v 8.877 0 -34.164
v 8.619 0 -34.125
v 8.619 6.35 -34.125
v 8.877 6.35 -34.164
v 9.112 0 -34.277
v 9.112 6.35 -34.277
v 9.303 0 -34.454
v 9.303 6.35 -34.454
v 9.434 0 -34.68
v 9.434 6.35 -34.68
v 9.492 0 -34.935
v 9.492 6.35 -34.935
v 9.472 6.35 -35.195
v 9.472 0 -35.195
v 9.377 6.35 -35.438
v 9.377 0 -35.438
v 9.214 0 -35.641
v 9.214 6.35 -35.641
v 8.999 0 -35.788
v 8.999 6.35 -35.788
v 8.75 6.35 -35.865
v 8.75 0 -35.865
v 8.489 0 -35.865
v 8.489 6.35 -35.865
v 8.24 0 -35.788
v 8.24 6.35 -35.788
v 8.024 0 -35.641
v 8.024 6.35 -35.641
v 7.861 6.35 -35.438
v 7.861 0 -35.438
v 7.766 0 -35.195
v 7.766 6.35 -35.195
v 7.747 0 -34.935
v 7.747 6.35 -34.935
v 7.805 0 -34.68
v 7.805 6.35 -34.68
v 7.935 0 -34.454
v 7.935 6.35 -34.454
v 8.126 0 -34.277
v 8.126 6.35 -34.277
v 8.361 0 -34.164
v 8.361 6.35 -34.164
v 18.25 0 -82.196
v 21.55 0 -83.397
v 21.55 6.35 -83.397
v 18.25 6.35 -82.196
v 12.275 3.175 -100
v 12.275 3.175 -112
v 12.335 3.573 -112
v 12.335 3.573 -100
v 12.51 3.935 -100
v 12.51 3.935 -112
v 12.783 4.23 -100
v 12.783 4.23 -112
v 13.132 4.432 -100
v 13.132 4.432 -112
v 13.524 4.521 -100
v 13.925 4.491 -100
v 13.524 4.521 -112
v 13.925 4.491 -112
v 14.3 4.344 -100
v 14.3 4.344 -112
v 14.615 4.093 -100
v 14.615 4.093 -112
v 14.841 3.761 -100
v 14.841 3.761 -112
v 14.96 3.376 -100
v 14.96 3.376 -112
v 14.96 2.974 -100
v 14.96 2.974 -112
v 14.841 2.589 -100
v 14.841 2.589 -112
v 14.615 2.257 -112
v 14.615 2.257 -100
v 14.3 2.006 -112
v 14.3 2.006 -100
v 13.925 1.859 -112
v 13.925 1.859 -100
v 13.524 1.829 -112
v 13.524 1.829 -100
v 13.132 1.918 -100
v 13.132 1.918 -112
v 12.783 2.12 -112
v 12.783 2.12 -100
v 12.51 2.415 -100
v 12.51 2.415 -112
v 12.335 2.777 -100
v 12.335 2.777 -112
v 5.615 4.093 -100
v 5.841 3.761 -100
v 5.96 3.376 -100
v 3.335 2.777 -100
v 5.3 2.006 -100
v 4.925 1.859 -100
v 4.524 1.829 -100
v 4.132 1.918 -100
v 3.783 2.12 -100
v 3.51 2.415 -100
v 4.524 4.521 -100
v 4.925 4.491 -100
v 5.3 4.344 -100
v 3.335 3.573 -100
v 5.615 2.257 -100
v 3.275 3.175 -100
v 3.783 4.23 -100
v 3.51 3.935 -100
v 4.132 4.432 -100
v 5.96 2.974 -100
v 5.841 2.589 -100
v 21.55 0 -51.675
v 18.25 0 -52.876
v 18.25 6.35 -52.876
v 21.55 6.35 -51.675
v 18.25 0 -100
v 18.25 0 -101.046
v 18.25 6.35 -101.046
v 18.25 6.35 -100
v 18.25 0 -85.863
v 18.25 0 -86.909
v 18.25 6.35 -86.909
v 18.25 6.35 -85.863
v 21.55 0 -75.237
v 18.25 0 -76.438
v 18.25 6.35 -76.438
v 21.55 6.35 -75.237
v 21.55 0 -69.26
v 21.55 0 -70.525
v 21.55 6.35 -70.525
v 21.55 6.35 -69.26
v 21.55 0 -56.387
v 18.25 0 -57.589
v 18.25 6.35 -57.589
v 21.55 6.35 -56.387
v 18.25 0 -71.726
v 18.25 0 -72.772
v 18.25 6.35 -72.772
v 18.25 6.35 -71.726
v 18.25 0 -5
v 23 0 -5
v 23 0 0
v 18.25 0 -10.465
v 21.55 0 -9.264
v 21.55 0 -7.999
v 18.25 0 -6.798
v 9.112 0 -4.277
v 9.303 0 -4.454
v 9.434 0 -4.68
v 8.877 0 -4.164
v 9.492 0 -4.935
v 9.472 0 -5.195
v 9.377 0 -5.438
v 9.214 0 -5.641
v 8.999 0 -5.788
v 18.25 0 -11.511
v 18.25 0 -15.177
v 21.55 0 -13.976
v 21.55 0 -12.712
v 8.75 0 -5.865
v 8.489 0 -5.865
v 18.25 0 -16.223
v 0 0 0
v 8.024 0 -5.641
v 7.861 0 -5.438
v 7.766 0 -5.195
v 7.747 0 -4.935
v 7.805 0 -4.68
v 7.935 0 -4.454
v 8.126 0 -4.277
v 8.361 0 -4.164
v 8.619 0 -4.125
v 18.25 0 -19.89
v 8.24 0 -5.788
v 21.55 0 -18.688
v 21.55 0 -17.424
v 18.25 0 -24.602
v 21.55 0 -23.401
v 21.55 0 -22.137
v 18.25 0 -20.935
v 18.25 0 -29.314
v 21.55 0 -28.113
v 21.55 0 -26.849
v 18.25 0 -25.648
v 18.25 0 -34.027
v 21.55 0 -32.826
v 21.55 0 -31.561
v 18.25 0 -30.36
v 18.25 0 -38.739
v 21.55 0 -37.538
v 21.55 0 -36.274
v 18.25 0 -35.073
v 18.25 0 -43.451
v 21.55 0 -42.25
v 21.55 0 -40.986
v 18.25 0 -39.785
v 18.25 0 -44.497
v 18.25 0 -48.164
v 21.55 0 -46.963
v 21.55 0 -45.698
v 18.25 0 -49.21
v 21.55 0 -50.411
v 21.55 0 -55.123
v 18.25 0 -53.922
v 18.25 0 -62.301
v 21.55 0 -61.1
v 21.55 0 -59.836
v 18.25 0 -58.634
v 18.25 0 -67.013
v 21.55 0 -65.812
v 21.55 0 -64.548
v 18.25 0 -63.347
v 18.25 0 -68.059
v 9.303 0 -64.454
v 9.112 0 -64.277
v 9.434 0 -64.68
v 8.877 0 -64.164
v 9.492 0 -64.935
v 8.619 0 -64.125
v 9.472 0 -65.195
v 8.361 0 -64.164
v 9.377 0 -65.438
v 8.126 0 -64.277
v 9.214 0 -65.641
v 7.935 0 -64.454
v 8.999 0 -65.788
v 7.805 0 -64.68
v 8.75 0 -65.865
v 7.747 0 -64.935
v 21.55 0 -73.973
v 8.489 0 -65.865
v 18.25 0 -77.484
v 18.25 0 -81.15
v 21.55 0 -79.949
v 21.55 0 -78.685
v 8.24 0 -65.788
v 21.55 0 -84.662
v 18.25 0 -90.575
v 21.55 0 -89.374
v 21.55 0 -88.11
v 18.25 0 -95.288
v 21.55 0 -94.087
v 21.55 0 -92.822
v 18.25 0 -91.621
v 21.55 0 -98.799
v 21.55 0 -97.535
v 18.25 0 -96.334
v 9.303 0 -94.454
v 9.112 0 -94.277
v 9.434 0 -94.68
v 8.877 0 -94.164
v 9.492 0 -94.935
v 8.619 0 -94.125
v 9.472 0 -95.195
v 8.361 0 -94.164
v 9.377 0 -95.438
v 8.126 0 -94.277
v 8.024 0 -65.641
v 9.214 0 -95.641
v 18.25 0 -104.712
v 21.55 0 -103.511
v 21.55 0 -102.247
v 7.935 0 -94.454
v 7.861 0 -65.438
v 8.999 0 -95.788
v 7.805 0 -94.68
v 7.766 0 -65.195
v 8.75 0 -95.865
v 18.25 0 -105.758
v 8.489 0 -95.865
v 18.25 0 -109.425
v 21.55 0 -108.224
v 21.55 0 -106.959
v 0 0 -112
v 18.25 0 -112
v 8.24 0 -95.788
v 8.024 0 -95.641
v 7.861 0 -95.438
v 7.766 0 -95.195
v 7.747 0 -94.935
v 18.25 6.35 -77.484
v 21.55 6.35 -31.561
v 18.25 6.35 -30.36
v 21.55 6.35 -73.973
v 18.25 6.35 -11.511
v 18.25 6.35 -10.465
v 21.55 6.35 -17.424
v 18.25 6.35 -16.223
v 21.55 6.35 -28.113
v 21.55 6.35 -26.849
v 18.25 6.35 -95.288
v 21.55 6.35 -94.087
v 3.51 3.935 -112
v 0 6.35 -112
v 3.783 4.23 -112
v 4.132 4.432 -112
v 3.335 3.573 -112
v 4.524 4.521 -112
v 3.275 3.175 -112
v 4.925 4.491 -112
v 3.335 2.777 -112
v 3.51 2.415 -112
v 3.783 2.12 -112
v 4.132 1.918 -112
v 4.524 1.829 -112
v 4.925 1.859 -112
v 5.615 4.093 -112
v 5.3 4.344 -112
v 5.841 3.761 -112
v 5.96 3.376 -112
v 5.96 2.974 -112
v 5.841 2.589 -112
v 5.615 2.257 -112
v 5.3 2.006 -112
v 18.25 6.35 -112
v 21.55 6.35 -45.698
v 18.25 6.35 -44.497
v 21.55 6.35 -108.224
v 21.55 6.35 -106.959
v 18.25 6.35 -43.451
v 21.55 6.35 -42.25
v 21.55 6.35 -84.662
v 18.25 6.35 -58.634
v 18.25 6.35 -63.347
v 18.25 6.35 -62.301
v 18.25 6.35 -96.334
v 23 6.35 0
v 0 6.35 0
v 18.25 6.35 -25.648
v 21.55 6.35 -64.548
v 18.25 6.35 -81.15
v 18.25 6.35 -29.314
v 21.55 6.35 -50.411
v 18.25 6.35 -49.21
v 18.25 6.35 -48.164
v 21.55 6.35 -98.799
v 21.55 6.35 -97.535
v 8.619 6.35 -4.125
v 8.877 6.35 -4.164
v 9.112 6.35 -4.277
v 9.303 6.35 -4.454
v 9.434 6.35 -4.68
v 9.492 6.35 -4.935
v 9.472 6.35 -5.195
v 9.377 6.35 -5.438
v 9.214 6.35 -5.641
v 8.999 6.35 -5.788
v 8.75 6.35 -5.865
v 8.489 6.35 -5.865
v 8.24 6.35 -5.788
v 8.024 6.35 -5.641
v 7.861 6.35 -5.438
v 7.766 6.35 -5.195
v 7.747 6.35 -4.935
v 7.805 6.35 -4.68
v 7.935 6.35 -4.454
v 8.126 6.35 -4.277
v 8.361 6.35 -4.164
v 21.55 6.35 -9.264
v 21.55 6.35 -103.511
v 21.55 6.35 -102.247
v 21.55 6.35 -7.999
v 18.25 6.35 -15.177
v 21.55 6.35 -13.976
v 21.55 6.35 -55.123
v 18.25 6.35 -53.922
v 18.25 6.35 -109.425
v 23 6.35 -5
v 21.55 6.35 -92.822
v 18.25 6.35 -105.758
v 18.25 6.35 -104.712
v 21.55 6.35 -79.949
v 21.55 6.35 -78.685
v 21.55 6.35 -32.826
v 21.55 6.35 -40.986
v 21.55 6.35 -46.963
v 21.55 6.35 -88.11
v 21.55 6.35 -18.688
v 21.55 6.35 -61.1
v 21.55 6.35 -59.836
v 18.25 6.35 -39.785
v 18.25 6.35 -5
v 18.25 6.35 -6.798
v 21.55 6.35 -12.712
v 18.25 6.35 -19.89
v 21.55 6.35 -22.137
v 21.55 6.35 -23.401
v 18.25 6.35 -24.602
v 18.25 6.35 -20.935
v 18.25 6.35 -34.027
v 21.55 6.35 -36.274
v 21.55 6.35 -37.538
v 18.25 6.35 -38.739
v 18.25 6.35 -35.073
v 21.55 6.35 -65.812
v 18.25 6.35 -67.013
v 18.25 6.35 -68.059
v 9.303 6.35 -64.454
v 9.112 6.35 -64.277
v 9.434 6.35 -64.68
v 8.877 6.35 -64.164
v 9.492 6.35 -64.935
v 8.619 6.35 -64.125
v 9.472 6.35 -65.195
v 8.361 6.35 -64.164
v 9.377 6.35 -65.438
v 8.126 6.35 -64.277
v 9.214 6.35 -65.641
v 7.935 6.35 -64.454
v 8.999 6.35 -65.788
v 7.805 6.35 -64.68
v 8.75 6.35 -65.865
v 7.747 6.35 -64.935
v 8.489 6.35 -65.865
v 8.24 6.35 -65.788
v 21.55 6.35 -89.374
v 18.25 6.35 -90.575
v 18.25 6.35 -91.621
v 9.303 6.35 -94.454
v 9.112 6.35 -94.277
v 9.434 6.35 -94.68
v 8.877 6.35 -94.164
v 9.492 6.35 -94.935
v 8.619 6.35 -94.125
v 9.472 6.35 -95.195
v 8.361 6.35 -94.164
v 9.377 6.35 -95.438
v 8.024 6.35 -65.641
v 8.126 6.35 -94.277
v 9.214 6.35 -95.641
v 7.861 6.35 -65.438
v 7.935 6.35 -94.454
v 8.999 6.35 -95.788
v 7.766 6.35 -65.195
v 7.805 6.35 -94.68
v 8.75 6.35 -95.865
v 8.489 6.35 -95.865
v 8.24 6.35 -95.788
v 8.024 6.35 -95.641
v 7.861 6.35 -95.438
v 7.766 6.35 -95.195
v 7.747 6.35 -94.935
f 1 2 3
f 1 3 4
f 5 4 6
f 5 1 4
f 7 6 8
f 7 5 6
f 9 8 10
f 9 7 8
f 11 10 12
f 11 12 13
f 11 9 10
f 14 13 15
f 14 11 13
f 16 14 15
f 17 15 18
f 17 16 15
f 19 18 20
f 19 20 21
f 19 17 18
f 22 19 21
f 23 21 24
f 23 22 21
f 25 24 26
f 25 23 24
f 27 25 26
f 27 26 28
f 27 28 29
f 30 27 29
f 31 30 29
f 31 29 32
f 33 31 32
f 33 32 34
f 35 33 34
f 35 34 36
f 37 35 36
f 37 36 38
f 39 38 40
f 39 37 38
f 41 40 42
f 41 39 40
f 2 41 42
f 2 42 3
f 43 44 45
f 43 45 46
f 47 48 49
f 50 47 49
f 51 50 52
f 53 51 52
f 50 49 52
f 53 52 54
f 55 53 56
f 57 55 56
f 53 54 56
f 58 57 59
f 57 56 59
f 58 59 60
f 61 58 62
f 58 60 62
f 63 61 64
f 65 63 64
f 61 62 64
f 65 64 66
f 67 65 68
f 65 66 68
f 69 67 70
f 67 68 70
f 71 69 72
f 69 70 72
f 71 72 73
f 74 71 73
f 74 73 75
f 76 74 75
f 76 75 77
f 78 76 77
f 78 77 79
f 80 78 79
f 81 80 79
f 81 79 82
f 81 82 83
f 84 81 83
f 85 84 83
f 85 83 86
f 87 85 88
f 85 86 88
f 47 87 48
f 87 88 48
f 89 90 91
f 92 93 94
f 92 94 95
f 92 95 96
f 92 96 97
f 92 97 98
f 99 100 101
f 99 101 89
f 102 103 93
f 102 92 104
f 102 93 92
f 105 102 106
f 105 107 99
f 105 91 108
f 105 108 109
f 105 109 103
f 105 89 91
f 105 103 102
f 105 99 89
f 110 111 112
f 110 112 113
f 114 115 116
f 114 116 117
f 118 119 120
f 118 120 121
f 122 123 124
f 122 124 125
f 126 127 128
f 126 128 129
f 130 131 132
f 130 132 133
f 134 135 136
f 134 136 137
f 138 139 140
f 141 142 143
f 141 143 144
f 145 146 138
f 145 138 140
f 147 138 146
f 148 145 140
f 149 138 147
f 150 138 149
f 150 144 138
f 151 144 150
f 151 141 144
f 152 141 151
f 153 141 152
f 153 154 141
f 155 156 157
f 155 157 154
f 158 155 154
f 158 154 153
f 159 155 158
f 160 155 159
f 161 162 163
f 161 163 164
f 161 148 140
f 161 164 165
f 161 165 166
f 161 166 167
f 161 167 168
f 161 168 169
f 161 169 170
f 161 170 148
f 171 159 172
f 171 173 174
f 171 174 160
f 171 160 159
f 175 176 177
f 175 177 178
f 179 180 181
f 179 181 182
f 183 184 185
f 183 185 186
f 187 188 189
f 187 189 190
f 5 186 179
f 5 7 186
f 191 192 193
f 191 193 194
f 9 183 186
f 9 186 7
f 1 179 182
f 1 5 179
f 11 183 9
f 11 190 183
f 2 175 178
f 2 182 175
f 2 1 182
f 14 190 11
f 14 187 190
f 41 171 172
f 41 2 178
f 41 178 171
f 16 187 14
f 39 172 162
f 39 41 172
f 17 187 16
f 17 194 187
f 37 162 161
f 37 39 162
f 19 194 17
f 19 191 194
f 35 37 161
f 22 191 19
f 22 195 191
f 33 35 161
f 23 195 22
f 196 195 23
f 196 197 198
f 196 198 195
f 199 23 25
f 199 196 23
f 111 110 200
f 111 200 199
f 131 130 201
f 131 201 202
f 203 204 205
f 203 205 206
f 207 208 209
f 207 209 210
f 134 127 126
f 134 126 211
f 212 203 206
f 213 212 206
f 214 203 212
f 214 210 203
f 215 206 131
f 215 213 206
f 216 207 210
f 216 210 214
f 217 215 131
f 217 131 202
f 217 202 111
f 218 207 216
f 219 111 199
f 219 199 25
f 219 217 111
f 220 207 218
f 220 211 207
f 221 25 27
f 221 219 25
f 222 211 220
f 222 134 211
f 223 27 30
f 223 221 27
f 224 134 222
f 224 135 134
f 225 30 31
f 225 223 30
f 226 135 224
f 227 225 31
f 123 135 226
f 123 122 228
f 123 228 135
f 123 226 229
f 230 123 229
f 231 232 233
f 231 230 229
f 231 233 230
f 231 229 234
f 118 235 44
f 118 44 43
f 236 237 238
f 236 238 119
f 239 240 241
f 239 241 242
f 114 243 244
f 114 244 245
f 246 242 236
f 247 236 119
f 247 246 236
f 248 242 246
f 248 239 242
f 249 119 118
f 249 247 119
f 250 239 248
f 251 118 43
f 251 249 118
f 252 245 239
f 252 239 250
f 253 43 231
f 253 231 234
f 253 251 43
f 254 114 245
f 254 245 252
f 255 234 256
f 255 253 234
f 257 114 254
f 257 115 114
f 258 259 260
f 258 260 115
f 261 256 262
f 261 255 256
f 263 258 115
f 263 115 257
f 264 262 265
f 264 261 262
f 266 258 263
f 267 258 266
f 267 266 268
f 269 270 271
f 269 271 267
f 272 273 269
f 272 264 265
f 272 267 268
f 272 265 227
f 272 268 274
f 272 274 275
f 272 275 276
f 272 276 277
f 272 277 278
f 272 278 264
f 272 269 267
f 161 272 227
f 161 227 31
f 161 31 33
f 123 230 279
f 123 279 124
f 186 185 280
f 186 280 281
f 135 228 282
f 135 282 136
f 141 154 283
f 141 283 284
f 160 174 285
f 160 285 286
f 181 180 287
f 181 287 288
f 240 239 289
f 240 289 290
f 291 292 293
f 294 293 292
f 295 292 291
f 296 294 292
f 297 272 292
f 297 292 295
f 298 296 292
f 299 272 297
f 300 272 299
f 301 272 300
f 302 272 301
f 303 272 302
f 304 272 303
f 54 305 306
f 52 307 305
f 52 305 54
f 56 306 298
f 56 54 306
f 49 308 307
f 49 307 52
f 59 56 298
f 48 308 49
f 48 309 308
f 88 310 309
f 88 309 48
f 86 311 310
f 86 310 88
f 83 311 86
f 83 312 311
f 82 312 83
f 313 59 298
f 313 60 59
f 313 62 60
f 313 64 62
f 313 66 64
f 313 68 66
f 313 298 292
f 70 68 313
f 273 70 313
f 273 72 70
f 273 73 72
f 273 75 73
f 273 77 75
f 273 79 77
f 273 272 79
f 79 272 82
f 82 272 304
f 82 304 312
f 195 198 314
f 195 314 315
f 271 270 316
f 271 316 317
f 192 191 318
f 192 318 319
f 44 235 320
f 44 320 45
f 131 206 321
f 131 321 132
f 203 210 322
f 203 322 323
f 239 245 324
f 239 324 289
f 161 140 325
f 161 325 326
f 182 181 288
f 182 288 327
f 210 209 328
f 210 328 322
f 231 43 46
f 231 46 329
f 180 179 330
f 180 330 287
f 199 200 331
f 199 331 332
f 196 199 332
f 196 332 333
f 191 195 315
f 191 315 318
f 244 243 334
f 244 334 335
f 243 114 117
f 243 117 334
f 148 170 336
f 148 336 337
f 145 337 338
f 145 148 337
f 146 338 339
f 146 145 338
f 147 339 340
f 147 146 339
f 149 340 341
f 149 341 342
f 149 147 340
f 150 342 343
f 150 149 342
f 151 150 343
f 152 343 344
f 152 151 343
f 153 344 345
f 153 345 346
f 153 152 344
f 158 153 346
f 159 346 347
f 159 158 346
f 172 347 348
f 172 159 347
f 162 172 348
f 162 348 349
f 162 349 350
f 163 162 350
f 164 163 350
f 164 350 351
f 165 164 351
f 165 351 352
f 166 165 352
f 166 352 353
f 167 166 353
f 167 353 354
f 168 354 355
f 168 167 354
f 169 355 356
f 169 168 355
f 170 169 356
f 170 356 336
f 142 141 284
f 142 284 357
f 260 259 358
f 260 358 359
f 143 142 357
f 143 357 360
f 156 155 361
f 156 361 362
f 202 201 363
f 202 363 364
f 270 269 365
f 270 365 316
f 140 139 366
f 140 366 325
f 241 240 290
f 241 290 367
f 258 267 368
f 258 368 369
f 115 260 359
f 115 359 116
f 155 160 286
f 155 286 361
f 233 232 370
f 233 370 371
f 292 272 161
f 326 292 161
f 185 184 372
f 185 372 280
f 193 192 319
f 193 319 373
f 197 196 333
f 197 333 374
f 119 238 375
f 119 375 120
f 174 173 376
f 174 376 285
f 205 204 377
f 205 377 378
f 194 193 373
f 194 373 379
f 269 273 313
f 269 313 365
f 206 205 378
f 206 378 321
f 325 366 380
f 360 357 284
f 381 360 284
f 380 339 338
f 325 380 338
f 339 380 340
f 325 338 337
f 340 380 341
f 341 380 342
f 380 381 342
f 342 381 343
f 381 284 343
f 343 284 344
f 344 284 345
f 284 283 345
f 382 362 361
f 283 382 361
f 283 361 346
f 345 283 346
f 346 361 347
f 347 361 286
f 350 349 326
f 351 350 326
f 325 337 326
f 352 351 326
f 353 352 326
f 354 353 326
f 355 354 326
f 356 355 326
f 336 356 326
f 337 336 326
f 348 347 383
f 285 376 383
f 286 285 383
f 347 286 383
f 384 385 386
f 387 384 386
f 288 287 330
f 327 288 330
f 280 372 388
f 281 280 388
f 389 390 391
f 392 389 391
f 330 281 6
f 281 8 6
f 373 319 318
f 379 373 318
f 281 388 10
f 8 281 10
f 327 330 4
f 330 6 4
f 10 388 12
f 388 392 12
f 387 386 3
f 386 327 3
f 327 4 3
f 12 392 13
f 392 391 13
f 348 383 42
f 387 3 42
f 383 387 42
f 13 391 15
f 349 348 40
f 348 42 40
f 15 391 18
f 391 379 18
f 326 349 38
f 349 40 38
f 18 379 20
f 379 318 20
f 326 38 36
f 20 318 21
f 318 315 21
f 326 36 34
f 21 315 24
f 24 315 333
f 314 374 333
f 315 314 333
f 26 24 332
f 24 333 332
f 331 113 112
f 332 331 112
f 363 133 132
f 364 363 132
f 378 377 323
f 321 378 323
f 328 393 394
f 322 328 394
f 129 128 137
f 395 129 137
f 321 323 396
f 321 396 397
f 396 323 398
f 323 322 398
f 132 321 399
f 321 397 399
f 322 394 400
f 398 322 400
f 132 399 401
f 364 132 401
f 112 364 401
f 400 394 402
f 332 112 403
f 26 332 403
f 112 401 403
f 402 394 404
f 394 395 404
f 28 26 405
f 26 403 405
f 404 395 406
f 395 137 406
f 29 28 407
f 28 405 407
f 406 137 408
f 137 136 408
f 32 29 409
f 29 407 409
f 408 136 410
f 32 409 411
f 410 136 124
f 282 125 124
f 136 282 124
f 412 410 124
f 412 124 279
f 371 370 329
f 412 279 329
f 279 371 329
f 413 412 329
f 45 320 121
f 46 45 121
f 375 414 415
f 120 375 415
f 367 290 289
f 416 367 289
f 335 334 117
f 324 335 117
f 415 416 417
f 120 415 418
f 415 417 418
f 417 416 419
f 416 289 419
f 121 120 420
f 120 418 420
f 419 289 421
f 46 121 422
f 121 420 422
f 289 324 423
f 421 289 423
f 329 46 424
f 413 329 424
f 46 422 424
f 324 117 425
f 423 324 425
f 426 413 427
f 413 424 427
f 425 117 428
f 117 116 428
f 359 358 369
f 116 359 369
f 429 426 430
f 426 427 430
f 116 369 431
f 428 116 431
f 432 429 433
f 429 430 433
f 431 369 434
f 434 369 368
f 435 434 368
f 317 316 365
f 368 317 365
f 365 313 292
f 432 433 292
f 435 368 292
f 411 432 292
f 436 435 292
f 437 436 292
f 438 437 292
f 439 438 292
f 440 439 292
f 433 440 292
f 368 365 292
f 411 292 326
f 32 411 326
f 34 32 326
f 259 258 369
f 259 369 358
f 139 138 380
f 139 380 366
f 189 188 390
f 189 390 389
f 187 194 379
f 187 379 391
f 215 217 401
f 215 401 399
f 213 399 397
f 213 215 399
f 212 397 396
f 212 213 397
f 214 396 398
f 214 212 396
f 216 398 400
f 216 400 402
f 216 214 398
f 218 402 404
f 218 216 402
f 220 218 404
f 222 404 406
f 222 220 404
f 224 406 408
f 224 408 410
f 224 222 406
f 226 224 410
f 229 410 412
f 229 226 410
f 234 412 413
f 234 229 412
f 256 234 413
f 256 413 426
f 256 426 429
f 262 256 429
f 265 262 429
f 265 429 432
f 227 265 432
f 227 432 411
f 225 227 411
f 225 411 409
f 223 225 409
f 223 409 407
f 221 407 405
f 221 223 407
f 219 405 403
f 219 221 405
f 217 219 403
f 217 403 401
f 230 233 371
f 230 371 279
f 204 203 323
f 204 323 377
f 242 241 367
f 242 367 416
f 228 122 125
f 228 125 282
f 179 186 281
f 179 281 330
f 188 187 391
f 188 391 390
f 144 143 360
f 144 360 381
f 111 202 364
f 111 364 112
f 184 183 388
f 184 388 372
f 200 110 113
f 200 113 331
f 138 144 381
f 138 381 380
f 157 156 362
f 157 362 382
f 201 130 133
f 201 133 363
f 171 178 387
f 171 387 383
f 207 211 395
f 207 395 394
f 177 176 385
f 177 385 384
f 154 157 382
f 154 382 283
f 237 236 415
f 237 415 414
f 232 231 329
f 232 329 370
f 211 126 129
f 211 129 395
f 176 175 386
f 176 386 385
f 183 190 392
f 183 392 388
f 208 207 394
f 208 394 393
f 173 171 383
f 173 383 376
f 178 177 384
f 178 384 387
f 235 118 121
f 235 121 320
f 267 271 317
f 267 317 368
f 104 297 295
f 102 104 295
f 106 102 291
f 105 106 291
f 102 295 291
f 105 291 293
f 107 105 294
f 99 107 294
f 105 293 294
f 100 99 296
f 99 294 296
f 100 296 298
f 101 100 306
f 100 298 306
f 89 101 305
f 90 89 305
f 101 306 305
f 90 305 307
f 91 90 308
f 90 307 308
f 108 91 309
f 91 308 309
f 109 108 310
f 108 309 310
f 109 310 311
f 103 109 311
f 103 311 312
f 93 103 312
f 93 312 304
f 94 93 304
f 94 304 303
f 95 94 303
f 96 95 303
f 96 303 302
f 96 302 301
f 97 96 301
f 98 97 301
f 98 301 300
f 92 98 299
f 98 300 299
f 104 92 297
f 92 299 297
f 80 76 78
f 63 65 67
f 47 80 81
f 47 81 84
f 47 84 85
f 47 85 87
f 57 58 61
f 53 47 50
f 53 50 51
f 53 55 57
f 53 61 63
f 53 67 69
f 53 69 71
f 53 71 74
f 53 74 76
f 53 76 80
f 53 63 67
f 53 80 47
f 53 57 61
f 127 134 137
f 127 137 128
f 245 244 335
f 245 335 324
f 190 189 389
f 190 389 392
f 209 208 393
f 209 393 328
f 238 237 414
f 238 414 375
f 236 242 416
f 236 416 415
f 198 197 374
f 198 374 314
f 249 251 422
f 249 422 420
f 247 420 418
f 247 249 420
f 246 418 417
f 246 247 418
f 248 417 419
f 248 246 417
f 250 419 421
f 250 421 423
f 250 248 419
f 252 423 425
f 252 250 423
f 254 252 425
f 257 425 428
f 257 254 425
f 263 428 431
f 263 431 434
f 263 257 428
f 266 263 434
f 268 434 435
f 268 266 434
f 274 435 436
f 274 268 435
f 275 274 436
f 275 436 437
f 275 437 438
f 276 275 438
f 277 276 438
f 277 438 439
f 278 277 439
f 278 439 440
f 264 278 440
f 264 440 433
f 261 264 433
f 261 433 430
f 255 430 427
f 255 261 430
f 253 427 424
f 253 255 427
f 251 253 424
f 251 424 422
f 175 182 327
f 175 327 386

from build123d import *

# Parameters (mm, degrees)
SKETCH1_R           = 0.875
BOSS_EXTRUDE1_DEPTH = 6.35
SKETCH2_R           = 1.35
CUT_EXTRUDE1_DEPTH  = 12


with BuildPart() as part:
    # Sketch1 → Boss-Extrude1 (new body)
    with BuildSketch(Plane(origin=(0, 0, 0), x_dir=(1, 0, 0), z_dir=(0, 1, 0))):
        Polygon((0, 0), (0, 100), (0, 112), (18.25, 112), (18.25, 109.424759036), (21.549993184, 108.223659704), (21.549993186, 106.959378538), (18.25, 105.758279069), (18.25, 104.712379468), (21.549993194, 103.511280133), (21.549993196, 102.246998966), (18.25, 101.045899493), (18.25, 100), (21.549993184, 98.798900669), (21.549993186, 97.534619502), (18.25, 96.333520033), (18.25, 95.287620432), (21.549993194, 94.086521097), (21.549993196, 92.822239931), (18.25, 91.621140458), (18.25, 90.575240964), (21.549993204, 89.374141626), (21.549993207, 88.109860459), (18.25, 86.908760983), (18.25, 85.862861496), (21.549993214, 84.661762154), (21.549993217, 83.397480988), (18.25, 82.196381507), (18.25, 81.150481929), (21.549993224, 79.949382583), (21.549993227, 78.685101416), (18.25, 77.484001932), (18.25, 76.438102461), (21.549993234, 75.237003111), (21.549993237, 73.972721945), (18.25, 72.771622457), (18.25, 71.725722993), (21.549993244, 70.524623639), (21.549993247, 69.260342473), (18.25, 68.059242982), (18.25, 67.013343425), (21.549993254, 65.812244068), (21.549993257, 64.547962902), (18.25, 63.346863406), (18.25, 62.300963957), (21.549993265, 61.099864596), (21.549993267, 59.83558343), (18.25, 58.634483931), (18.25, 57.588584489), (21.549993275, 56.387485125), (21.549993277, 55.123203959), (18.25, 53.922104456), (18.25, 52.876204922), (21.549993285, 51.675105553), (21.549993288, 50.410824387), (18.25, 49.209724881), (18.25, 48.163825454), (21.549993295, 46.962726082), (21.549993298, 45.698444915), (18.25, 44.497345406), (18.25, 43.451445986), (21.549993305, 42.25034661), (21.549993308, 40.986065444), (18.25, 39.78496593), (18.25, 38.739066418), (21.549993315, 37.537967039), (21.549993318, 36.273685872), (18.25, 35.072586355), (18.25, 34.026686847), (21.549993325, 32.825587464), (21.549993328, 31.561306401), (18.25, 30.36020688), (18.25, 29.314307482), (21.549993336, 28.113208096), (21.549993338, 26.848926929), (18.25, 25.647827405), (18.25, 24.601927915), (21.549993346, 23.400828524), (21.549993348, 22.136547358), (18.25, 20.935447829), (18.25, 19.889548447), (21.549993356, 18.688449053), (21.549993359, 17.424167886), (18.25, 16.223068354), (18.25, 15.177168979), (21.549993366, 13.976069581), (21.549993369, 12.711788415), (18.25, 11.510688879), (18.25, 10.464789411), (21.549993376, 9.26369001), (21.549993379, 7.999408843), (18.25, 6.798309304), (18.25, 5), (23, 5), (23, 0), align=None)
        with Locations(Location((8.619246516, 95, 0), (0, 0, 270))):
            Circle(SKETCH1_R, mode=Mode.SUBTRACT)
        with Locations(Location((8.619246516, 65, 0), (0, 0, 270))):
            Circle(SKETCH1_R, mode=Mode.SUBTRACT)
        with Locations(Location((8.619246516, 35, 0), (0, 0, 270))):
            Circle(SKETCH1_R, mode=Mode.SUBTRACT)
        with Locations(Location((8.619246516, 5, 0), (0, 0, 270))):
            Circle(SKETCH1_R, mode=Mode.SUBTRACT)
    extrude(amount=BOSS_EXTRUDE1_DEPTH)

    # Sketch2 → Cut-Extrude1 (cut)
    with BuildSketch(Plane(origin=(0, 0, -112), x_dir=(-1, 0, 0), z_dir=(0, 0, -1))):
        with Locations((-13.625, 3.175)):
            Circle(SKETCH2_R)
        with Locations((-4.625, 3.175)):
            Circle(SKETCH2_R)
    extrude(amount=-CUT_EXTRUDE1_DEPTH, mode=Mode.SUBTRACT)


solid = part.part
